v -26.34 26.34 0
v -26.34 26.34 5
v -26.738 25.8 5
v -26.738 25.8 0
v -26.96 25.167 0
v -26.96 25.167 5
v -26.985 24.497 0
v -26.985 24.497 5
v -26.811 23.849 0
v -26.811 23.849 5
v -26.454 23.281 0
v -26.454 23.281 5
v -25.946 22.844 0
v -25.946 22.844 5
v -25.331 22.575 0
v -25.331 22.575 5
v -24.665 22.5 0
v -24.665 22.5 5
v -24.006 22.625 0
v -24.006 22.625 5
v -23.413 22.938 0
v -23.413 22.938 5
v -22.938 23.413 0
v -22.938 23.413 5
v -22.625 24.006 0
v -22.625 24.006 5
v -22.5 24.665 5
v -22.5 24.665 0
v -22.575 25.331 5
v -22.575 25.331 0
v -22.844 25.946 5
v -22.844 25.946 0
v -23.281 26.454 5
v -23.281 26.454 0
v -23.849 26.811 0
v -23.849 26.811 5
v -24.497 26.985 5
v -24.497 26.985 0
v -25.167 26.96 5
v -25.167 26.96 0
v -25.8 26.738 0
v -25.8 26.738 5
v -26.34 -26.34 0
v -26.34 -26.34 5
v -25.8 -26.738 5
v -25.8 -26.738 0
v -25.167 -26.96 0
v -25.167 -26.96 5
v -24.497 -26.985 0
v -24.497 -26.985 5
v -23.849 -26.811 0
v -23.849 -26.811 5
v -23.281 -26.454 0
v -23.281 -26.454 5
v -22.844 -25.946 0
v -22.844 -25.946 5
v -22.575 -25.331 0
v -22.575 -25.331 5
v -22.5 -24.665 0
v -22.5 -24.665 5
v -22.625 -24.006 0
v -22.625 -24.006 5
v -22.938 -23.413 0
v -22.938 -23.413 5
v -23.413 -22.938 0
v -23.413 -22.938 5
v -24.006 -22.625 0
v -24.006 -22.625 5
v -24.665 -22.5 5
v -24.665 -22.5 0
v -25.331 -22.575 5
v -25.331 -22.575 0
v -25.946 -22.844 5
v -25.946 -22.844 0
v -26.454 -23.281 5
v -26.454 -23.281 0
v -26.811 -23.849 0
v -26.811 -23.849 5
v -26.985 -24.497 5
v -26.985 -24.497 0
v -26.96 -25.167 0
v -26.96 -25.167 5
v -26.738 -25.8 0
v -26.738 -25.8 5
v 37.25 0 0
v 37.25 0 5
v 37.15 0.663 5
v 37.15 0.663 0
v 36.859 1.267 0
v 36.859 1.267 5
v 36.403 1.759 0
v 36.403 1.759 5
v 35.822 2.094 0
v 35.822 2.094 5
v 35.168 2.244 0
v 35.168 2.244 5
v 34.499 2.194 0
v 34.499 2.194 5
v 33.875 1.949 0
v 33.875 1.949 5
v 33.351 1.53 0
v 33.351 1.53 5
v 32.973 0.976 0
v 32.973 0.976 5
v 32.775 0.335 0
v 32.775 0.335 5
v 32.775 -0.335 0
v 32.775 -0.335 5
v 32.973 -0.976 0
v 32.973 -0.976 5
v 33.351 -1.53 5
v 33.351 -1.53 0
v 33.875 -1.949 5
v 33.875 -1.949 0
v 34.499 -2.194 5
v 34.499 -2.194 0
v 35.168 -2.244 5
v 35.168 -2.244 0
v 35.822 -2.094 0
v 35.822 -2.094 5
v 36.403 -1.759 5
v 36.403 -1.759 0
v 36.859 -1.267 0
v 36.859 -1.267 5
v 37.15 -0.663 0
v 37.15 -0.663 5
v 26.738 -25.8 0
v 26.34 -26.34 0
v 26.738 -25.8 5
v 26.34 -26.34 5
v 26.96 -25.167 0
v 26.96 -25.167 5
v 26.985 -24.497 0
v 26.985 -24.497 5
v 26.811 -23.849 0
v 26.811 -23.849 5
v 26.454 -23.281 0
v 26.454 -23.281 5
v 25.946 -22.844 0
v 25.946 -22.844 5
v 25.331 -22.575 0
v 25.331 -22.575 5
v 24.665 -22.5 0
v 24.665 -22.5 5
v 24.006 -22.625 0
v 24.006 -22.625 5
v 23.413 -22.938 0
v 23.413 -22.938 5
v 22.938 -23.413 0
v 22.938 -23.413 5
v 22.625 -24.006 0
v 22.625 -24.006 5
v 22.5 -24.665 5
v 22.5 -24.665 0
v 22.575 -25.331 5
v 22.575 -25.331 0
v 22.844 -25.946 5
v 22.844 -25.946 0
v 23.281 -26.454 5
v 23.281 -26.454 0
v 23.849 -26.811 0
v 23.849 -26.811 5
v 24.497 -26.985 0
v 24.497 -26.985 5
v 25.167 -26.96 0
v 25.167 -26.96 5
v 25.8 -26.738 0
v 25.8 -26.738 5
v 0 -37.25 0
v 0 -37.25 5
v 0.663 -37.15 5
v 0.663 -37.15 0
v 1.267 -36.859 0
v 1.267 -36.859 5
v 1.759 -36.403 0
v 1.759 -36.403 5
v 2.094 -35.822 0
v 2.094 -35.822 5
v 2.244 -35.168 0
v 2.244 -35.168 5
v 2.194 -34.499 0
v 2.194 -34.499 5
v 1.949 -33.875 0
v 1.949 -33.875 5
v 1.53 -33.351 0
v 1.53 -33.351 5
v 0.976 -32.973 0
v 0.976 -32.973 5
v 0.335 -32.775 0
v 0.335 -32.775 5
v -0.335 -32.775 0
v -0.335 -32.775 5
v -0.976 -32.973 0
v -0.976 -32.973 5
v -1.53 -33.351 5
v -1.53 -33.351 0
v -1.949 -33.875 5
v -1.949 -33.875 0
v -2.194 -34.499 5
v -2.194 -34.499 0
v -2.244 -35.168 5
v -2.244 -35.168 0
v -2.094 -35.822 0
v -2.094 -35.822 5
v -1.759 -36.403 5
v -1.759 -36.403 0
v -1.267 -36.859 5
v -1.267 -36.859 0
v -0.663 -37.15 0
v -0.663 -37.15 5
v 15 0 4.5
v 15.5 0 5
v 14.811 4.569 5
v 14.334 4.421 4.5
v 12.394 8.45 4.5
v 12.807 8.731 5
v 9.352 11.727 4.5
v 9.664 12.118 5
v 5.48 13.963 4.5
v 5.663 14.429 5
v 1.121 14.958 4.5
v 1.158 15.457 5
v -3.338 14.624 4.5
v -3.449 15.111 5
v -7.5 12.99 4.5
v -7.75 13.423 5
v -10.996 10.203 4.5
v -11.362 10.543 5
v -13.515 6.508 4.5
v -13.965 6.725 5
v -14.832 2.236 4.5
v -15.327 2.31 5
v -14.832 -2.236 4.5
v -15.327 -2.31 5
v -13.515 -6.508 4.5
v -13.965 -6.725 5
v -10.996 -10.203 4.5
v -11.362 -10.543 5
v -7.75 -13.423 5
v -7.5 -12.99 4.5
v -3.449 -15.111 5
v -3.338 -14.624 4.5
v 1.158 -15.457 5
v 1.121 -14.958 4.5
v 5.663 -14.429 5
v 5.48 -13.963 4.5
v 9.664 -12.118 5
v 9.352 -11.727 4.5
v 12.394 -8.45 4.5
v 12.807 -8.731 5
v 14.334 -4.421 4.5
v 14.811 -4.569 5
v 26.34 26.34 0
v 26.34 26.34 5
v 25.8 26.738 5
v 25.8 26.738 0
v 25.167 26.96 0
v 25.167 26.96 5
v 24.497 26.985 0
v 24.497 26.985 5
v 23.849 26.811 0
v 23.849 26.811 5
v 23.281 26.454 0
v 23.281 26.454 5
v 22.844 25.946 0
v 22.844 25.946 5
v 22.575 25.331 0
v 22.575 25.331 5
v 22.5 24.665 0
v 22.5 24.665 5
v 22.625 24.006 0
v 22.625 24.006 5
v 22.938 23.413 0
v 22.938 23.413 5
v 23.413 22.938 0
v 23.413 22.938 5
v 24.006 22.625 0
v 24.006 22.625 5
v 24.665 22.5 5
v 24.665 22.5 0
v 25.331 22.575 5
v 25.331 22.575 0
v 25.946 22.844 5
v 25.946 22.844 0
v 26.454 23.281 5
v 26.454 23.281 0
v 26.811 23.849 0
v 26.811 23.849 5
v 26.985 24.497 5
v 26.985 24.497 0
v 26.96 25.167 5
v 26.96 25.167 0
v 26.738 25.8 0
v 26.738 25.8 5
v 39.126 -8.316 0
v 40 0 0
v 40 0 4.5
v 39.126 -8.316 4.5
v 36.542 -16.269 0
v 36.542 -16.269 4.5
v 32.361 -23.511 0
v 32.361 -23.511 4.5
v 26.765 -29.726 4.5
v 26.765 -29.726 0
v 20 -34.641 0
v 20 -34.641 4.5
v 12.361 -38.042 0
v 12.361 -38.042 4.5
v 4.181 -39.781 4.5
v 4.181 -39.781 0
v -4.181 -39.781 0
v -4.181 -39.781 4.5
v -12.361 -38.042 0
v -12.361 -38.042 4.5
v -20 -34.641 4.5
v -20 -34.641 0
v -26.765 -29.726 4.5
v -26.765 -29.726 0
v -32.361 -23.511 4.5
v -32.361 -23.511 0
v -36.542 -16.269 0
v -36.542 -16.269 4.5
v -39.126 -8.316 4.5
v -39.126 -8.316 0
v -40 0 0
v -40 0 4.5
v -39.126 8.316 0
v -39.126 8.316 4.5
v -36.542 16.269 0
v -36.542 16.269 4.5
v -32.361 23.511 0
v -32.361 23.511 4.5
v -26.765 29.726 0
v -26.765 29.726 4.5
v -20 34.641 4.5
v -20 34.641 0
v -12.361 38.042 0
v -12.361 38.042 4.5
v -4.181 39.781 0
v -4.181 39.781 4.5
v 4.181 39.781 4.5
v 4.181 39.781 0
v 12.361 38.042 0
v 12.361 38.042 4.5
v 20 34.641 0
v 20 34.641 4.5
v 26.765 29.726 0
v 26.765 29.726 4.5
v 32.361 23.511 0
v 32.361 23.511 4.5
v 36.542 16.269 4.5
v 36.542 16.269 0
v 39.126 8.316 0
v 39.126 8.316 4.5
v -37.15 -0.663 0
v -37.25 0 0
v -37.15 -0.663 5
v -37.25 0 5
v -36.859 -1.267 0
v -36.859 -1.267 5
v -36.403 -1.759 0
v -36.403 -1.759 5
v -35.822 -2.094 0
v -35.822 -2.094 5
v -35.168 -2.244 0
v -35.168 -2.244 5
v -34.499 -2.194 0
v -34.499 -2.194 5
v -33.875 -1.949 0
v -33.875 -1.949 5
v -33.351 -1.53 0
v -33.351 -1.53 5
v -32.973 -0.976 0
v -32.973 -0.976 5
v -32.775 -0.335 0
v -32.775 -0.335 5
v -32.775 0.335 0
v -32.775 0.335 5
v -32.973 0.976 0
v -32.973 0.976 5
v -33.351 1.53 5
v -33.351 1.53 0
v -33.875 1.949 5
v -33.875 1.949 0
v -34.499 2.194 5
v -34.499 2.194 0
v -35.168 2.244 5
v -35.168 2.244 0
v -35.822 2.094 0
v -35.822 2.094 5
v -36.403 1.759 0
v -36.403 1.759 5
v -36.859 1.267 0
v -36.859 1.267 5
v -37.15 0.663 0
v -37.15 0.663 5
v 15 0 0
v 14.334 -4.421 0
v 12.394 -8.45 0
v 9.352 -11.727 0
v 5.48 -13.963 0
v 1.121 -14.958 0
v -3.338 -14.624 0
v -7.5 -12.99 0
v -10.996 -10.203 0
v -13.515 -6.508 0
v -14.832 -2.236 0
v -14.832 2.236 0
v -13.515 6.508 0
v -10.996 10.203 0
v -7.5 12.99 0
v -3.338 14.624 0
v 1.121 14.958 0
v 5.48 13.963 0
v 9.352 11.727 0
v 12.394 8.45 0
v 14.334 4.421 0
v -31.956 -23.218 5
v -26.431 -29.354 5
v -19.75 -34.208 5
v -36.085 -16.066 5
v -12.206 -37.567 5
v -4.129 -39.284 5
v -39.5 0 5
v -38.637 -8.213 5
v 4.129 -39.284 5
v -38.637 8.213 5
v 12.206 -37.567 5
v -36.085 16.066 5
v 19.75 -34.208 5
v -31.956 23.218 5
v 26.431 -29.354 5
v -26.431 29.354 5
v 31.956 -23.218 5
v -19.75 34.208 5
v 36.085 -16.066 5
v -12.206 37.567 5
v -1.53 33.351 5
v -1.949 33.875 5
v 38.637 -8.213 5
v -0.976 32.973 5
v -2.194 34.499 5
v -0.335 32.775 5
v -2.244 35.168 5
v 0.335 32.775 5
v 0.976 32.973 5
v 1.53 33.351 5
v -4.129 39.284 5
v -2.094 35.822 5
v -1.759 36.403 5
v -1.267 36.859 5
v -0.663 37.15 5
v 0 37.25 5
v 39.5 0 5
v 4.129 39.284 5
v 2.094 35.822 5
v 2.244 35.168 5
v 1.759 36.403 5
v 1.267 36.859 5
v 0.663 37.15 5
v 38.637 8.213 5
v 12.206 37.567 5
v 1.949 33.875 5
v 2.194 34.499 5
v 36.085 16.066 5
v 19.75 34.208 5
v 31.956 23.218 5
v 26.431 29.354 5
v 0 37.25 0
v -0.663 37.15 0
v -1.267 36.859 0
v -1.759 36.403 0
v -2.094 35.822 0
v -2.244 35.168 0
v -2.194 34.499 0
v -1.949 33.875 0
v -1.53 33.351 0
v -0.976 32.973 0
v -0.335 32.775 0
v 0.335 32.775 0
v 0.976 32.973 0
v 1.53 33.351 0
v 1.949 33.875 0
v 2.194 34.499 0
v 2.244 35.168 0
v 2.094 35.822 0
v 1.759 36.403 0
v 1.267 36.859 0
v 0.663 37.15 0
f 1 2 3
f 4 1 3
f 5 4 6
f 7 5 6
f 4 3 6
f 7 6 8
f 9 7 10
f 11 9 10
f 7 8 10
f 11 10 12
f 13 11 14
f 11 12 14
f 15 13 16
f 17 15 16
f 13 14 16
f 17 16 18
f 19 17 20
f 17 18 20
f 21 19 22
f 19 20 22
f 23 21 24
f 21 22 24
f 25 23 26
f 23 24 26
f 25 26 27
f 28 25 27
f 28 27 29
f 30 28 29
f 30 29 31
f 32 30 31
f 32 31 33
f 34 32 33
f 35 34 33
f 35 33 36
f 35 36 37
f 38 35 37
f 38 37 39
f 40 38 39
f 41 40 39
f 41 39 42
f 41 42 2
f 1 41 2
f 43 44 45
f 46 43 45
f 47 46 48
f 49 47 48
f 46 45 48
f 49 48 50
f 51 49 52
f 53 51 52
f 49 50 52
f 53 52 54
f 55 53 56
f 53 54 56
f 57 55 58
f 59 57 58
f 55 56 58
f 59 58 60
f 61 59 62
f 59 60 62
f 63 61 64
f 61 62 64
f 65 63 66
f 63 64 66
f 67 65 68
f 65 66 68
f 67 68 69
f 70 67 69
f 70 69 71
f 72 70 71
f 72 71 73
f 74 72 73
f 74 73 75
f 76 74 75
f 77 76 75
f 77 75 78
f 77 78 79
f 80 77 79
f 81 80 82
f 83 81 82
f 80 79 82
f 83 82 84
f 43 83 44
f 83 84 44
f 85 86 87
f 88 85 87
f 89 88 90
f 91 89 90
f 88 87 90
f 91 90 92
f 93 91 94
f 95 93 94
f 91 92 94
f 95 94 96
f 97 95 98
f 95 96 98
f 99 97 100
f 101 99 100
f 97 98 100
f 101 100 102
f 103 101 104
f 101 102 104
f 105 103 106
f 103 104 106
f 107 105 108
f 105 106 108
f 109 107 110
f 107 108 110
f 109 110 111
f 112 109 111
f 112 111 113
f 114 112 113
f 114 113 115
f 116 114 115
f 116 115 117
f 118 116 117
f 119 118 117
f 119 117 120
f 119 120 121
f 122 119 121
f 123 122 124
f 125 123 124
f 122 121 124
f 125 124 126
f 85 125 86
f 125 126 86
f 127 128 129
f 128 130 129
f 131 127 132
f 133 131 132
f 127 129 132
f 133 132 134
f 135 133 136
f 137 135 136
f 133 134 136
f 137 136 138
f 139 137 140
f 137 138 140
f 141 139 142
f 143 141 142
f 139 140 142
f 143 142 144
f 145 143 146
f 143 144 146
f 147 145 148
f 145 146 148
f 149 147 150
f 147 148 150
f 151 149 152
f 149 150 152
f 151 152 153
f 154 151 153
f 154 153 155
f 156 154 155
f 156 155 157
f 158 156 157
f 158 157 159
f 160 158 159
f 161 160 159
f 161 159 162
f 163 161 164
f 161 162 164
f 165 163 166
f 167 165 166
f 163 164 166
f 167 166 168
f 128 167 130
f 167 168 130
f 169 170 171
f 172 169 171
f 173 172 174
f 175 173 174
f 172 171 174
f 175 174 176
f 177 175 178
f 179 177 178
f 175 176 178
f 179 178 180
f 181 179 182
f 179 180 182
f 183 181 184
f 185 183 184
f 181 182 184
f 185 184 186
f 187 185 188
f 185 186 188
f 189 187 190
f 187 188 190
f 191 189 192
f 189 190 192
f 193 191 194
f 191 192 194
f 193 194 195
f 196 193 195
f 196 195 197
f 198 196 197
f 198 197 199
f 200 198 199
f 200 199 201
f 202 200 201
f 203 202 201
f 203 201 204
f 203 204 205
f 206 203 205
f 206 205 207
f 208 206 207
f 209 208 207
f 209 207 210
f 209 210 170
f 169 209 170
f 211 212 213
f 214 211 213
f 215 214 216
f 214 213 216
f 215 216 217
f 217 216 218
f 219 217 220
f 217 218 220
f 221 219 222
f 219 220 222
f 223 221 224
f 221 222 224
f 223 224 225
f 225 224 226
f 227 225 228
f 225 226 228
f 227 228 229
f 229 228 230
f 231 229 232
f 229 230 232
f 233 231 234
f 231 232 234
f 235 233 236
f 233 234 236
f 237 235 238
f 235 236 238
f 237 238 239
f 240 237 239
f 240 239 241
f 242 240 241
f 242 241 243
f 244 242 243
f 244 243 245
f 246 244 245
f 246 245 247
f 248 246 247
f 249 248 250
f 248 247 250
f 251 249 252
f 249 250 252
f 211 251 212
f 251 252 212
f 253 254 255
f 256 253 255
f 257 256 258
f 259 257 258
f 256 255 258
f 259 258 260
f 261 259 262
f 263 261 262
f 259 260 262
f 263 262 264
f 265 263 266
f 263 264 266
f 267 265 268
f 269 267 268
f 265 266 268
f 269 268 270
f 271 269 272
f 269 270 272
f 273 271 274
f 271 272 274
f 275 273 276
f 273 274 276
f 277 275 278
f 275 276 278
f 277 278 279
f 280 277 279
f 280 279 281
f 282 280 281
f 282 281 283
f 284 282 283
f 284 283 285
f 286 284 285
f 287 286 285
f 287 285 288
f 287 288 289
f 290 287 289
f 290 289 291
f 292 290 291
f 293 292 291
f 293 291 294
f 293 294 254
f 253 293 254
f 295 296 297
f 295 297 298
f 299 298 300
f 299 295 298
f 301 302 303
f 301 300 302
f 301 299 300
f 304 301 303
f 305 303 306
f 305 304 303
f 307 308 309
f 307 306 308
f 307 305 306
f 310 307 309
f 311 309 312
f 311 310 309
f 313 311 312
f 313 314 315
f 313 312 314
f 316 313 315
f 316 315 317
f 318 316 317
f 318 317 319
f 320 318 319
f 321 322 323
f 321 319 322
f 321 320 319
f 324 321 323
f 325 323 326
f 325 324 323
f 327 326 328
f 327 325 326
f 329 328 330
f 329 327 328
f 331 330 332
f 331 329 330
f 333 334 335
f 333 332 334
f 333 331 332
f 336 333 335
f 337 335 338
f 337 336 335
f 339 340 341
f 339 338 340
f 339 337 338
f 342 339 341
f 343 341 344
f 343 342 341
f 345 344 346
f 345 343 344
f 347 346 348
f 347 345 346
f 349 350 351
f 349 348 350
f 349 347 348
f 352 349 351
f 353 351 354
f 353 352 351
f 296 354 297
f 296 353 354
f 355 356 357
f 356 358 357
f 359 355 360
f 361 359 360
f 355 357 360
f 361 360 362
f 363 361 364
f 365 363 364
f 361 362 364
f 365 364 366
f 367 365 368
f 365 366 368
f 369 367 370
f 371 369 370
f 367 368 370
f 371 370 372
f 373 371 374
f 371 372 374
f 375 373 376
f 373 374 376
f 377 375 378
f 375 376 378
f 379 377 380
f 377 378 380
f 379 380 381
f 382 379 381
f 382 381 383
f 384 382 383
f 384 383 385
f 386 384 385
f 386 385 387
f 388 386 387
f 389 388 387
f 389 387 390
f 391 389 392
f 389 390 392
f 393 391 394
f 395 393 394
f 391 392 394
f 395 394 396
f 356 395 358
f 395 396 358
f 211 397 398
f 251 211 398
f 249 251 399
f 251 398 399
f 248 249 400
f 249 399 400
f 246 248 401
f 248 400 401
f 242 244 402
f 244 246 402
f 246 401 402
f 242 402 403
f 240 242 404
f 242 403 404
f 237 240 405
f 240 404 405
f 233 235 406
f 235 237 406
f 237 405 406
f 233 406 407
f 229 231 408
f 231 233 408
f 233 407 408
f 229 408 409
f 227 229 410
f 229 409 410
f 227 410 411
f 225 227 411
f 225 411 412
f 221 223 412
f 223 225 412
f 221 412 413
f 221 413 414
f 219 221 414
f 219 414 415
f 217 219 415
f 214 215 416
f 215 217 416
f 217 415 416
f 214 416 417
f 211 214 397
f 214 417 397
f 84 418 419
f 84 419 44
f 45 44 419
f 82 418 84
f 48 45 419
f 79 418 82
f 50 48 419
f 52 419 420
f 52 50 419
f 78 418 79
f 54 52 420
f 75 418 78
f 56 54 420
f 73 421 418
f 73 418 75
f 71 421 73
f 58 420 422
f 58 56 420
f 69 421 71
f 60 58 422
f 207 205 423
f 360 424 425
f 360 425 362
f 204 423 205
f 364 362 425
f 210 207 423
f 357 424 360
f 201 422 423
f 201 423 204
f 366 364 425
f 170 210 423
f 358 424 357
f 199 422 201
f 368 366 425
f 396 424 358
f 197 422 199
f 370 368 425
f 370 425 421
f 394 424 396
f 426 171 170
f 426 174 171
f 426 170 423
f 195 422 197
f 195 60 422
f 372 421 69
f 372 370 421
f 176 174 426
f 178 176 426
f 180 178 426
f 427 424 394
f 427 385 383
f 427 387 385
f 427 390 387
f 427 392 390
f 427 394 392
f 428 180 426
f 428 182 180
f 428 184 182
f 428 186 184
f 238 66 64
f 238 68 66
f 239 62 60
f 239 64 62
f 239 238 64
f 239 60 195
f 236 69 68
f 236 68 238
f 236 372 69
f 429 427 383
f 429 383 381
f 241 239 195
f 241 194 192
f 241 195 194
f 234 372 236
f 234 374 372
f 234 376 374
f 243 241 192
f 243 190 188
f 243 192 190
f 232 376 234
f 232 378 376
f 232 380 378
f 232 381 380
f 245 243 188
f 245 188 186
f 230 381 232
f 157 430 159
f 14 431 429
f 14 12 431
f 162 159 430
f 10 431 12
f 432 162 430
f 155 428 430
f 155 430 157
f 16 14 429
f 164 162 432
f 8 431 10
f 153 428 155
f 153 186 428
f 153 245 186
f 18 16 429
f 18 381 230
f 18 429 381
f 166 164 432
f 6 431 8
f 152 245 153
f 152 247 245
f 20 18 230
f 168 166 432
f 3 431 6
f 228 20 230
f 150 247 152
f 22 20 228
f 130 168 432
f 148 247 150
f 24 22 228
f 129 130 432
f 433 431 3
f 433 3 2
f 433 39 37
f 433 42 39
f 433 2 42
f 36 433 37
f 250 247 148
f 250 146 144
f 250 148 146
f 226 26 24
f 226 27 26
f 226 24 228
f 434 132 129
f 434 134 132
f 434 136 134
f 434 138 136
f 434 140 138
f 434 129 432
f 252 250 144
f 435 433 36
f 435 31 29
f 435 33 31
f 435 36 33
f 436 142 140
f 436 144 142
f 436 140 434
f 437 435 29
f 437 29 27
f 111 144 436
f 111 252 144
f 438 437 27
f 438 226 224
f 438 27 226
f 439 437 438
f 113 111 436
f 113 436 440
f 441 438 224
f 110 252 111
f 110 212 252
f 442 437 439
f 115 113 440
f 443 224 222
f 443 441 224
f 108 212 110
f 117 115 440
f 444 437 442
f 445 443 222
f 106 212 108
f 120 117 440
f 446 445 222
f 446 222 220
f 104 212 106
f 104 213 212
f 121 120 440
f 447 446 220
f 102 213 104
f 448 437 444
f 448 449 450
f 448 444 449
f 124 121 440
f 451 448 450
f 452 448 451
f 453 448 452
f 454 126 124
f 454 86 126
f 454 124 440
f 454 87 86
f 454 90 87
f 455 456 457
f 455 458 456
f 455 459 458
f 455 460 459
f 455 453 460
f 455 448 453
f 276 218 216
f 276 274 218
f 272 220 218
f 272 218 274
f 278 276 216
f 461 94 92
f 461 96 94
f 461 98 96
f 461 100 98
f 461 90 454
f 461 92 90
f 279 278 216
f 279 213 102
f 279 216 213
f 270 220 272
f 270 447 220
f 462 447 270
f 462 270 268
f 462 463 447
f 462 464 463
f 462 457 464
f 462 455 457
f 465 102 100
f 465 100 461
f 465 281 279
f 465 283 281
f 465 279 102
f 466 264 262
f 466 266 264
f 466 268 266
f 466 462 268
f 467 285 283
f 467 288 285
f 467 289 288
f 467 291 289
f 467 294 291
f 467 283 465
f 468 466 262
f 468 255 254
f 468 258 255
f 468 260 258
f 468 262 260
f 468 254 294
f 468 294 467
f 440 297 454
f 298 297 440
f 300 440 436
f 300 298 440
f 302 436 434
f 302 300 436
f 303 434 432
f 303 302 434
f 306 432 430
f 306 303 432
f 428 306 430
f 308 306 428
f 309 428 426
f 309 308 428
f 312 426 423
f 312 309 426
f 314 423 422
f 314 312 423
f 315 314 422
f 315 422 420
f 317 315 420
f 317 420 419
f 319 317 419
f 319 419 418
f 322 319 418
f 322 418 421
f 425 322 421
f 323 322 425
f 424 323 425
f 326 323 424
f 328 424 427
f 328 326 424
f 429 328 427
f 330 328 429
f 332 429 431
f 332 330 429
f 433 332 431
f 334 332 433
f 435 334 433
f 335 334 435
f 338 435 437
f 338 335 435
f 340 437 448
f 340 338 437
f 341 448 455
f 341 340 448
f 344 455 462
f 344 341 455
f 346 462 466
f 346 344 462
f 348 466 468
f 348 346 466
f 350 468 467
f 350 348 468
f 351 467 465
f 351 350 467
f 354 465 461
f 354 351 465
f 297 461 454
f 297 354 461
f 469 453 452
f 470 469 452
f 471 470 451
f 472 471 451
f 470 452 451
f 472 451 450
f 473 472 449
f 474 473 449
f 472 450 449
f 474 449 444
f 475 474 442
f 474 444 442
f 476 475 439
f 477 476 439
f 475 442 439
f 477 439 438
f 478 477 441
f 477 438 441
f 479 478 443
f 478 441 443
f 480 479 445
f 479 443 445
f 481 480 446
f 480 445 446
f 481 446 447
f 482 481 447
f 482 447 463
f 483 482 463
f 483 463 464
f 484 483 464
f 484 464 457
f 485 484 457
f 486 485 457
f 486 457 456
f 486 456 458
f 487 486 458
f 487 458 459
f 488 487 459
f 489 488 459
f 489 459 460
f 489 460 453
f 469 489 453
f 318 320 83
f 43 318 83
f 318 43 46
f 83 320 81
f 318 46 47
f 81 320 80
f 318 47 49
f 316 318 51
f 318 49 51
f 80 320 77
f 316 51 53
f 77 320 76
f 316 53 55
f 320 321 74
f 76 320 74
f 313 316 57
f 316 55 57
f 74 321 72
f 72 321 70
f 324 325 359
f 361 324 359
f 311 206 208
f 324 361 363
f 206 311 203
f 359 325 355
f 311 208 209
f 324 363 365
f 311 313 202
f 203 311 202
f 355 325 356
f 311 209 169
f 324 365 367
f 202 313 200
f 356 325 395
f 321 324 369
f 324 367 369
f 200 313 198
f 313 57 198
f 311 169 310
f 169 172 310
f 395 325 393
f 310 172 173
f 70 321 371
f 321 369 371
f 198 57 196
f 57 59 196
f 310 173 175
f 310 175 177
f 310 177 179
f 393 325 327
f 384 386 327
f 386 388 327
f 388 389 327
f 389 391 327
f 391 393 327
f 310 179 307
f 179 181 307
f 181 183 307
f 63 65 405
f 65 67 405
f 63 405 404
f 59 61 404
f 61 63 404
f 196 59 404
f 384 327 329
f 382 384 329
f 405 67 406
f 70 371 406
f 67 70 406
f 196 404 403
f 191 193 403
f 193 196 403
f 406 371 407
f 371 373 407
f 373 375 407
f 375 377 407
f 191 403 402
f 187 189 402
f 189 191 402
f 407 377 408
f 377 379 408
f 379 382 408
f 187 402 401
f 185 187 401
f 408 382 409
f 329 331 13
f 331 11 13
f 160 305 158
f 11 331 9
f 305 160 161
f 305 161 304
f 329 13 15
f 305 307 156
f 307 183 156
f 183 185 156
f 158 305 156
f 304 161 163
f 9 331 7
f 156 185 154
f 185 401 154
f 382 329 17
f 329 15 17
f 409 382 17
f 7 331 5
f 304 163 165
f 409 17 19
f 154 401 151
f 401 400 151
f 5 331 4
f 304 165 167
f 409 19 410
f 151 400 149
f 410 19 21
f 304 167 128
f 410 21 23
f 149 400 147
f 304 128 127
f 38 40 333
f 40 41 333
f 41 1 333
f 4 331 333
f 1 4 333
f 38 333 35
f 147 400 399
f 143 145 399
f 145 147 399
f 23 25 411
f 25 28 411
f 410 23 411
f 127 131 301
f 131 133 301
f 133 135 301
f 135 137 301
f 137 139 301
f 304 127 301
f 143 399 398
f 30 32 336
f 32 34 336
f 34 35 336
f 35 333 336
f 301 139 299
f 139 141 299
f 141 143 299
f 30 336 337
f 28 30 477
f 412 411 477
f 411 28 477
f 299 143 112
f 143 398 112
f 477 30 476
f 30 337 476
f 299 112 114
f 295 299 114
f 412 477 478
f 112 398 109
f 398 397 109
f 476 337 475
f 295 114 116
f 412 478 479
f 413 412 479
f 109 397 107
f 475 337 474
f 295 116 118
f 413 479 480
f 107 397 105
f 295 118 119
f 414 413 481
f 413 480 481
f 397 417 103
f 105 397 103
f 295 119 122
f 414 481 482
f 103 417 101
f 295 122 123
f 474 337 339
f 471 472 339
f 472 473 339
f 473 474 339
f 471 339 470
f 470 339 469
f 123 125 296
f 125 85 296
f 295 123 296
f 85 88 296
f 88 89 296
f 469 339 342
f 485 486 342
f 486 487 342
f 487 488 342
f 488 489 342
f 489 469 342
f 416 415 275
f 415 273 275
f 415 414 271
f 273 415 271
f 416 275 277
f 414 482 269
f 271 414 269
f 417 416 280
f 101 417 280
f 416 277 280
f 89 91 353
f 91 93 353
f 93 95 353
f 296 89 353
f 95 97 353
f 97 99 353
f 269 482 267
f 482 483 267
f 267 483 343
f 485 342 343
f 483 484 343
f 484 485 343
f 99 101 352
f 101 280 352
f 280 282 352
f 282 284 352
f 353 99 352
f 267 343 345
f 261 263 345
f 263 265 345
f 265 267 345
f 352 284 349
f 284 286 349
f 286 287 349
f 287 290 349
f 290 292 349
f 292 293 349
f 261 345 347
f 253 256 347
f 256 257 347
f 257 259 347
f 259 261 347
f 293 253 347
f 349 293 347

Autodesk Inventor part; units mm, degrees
ref_plane "YZ Plane" through (0, 0, 0) normal (1, 0, 0) x (0, 1, 0)
ref_plane "XZ Plane" through (0, 0, 0) normal (0, 1, 0) x (-1, 0, 0)
ref_plane "XY Plane" through (0, 0, 0) normal (0, 0, 1) x (1, 0, 0)
sketch "Sketch1" plane through (0, 0, 0) normal (0, 0, 1) x (1, 0, 0)
  circle A0 centre (0, 0) radius 40
  circle A1 centre (0, 0) radius 15
  circle A2 centre (0, 0) radius 35 construction
  line L0 (0, 0) -> (0, 35) construction
  line L1 (0, 0) -> (13.3939, 32.3358) construction
  dimension "d0" = 80
  dimension "d1" = 30
  dimension "d2" = 70
  dimension "d3" = 22.5
extrude "Extrusion1" add sketch "Sketch1" along normal blind 5
hole "Hole1" at (0, 35, 0) direction (0, 0, 1) diameter 4.5 depth 11.8 clearance for "Socket Head Cap Screw ISO 4762" size "M4" standard "ISO"
pattern_circular "Circular Pattern1" count 8 over 360 about axis through (0, 0, -10) along (0, 0, 1) of "Hole1"
chamfer "Chamfer1" distance 0.5 angle 45 2 edges at (-40, 0, 5) (-15, 0, 5)
properties part number "PWTR-0070" material "Stainless Steel"
